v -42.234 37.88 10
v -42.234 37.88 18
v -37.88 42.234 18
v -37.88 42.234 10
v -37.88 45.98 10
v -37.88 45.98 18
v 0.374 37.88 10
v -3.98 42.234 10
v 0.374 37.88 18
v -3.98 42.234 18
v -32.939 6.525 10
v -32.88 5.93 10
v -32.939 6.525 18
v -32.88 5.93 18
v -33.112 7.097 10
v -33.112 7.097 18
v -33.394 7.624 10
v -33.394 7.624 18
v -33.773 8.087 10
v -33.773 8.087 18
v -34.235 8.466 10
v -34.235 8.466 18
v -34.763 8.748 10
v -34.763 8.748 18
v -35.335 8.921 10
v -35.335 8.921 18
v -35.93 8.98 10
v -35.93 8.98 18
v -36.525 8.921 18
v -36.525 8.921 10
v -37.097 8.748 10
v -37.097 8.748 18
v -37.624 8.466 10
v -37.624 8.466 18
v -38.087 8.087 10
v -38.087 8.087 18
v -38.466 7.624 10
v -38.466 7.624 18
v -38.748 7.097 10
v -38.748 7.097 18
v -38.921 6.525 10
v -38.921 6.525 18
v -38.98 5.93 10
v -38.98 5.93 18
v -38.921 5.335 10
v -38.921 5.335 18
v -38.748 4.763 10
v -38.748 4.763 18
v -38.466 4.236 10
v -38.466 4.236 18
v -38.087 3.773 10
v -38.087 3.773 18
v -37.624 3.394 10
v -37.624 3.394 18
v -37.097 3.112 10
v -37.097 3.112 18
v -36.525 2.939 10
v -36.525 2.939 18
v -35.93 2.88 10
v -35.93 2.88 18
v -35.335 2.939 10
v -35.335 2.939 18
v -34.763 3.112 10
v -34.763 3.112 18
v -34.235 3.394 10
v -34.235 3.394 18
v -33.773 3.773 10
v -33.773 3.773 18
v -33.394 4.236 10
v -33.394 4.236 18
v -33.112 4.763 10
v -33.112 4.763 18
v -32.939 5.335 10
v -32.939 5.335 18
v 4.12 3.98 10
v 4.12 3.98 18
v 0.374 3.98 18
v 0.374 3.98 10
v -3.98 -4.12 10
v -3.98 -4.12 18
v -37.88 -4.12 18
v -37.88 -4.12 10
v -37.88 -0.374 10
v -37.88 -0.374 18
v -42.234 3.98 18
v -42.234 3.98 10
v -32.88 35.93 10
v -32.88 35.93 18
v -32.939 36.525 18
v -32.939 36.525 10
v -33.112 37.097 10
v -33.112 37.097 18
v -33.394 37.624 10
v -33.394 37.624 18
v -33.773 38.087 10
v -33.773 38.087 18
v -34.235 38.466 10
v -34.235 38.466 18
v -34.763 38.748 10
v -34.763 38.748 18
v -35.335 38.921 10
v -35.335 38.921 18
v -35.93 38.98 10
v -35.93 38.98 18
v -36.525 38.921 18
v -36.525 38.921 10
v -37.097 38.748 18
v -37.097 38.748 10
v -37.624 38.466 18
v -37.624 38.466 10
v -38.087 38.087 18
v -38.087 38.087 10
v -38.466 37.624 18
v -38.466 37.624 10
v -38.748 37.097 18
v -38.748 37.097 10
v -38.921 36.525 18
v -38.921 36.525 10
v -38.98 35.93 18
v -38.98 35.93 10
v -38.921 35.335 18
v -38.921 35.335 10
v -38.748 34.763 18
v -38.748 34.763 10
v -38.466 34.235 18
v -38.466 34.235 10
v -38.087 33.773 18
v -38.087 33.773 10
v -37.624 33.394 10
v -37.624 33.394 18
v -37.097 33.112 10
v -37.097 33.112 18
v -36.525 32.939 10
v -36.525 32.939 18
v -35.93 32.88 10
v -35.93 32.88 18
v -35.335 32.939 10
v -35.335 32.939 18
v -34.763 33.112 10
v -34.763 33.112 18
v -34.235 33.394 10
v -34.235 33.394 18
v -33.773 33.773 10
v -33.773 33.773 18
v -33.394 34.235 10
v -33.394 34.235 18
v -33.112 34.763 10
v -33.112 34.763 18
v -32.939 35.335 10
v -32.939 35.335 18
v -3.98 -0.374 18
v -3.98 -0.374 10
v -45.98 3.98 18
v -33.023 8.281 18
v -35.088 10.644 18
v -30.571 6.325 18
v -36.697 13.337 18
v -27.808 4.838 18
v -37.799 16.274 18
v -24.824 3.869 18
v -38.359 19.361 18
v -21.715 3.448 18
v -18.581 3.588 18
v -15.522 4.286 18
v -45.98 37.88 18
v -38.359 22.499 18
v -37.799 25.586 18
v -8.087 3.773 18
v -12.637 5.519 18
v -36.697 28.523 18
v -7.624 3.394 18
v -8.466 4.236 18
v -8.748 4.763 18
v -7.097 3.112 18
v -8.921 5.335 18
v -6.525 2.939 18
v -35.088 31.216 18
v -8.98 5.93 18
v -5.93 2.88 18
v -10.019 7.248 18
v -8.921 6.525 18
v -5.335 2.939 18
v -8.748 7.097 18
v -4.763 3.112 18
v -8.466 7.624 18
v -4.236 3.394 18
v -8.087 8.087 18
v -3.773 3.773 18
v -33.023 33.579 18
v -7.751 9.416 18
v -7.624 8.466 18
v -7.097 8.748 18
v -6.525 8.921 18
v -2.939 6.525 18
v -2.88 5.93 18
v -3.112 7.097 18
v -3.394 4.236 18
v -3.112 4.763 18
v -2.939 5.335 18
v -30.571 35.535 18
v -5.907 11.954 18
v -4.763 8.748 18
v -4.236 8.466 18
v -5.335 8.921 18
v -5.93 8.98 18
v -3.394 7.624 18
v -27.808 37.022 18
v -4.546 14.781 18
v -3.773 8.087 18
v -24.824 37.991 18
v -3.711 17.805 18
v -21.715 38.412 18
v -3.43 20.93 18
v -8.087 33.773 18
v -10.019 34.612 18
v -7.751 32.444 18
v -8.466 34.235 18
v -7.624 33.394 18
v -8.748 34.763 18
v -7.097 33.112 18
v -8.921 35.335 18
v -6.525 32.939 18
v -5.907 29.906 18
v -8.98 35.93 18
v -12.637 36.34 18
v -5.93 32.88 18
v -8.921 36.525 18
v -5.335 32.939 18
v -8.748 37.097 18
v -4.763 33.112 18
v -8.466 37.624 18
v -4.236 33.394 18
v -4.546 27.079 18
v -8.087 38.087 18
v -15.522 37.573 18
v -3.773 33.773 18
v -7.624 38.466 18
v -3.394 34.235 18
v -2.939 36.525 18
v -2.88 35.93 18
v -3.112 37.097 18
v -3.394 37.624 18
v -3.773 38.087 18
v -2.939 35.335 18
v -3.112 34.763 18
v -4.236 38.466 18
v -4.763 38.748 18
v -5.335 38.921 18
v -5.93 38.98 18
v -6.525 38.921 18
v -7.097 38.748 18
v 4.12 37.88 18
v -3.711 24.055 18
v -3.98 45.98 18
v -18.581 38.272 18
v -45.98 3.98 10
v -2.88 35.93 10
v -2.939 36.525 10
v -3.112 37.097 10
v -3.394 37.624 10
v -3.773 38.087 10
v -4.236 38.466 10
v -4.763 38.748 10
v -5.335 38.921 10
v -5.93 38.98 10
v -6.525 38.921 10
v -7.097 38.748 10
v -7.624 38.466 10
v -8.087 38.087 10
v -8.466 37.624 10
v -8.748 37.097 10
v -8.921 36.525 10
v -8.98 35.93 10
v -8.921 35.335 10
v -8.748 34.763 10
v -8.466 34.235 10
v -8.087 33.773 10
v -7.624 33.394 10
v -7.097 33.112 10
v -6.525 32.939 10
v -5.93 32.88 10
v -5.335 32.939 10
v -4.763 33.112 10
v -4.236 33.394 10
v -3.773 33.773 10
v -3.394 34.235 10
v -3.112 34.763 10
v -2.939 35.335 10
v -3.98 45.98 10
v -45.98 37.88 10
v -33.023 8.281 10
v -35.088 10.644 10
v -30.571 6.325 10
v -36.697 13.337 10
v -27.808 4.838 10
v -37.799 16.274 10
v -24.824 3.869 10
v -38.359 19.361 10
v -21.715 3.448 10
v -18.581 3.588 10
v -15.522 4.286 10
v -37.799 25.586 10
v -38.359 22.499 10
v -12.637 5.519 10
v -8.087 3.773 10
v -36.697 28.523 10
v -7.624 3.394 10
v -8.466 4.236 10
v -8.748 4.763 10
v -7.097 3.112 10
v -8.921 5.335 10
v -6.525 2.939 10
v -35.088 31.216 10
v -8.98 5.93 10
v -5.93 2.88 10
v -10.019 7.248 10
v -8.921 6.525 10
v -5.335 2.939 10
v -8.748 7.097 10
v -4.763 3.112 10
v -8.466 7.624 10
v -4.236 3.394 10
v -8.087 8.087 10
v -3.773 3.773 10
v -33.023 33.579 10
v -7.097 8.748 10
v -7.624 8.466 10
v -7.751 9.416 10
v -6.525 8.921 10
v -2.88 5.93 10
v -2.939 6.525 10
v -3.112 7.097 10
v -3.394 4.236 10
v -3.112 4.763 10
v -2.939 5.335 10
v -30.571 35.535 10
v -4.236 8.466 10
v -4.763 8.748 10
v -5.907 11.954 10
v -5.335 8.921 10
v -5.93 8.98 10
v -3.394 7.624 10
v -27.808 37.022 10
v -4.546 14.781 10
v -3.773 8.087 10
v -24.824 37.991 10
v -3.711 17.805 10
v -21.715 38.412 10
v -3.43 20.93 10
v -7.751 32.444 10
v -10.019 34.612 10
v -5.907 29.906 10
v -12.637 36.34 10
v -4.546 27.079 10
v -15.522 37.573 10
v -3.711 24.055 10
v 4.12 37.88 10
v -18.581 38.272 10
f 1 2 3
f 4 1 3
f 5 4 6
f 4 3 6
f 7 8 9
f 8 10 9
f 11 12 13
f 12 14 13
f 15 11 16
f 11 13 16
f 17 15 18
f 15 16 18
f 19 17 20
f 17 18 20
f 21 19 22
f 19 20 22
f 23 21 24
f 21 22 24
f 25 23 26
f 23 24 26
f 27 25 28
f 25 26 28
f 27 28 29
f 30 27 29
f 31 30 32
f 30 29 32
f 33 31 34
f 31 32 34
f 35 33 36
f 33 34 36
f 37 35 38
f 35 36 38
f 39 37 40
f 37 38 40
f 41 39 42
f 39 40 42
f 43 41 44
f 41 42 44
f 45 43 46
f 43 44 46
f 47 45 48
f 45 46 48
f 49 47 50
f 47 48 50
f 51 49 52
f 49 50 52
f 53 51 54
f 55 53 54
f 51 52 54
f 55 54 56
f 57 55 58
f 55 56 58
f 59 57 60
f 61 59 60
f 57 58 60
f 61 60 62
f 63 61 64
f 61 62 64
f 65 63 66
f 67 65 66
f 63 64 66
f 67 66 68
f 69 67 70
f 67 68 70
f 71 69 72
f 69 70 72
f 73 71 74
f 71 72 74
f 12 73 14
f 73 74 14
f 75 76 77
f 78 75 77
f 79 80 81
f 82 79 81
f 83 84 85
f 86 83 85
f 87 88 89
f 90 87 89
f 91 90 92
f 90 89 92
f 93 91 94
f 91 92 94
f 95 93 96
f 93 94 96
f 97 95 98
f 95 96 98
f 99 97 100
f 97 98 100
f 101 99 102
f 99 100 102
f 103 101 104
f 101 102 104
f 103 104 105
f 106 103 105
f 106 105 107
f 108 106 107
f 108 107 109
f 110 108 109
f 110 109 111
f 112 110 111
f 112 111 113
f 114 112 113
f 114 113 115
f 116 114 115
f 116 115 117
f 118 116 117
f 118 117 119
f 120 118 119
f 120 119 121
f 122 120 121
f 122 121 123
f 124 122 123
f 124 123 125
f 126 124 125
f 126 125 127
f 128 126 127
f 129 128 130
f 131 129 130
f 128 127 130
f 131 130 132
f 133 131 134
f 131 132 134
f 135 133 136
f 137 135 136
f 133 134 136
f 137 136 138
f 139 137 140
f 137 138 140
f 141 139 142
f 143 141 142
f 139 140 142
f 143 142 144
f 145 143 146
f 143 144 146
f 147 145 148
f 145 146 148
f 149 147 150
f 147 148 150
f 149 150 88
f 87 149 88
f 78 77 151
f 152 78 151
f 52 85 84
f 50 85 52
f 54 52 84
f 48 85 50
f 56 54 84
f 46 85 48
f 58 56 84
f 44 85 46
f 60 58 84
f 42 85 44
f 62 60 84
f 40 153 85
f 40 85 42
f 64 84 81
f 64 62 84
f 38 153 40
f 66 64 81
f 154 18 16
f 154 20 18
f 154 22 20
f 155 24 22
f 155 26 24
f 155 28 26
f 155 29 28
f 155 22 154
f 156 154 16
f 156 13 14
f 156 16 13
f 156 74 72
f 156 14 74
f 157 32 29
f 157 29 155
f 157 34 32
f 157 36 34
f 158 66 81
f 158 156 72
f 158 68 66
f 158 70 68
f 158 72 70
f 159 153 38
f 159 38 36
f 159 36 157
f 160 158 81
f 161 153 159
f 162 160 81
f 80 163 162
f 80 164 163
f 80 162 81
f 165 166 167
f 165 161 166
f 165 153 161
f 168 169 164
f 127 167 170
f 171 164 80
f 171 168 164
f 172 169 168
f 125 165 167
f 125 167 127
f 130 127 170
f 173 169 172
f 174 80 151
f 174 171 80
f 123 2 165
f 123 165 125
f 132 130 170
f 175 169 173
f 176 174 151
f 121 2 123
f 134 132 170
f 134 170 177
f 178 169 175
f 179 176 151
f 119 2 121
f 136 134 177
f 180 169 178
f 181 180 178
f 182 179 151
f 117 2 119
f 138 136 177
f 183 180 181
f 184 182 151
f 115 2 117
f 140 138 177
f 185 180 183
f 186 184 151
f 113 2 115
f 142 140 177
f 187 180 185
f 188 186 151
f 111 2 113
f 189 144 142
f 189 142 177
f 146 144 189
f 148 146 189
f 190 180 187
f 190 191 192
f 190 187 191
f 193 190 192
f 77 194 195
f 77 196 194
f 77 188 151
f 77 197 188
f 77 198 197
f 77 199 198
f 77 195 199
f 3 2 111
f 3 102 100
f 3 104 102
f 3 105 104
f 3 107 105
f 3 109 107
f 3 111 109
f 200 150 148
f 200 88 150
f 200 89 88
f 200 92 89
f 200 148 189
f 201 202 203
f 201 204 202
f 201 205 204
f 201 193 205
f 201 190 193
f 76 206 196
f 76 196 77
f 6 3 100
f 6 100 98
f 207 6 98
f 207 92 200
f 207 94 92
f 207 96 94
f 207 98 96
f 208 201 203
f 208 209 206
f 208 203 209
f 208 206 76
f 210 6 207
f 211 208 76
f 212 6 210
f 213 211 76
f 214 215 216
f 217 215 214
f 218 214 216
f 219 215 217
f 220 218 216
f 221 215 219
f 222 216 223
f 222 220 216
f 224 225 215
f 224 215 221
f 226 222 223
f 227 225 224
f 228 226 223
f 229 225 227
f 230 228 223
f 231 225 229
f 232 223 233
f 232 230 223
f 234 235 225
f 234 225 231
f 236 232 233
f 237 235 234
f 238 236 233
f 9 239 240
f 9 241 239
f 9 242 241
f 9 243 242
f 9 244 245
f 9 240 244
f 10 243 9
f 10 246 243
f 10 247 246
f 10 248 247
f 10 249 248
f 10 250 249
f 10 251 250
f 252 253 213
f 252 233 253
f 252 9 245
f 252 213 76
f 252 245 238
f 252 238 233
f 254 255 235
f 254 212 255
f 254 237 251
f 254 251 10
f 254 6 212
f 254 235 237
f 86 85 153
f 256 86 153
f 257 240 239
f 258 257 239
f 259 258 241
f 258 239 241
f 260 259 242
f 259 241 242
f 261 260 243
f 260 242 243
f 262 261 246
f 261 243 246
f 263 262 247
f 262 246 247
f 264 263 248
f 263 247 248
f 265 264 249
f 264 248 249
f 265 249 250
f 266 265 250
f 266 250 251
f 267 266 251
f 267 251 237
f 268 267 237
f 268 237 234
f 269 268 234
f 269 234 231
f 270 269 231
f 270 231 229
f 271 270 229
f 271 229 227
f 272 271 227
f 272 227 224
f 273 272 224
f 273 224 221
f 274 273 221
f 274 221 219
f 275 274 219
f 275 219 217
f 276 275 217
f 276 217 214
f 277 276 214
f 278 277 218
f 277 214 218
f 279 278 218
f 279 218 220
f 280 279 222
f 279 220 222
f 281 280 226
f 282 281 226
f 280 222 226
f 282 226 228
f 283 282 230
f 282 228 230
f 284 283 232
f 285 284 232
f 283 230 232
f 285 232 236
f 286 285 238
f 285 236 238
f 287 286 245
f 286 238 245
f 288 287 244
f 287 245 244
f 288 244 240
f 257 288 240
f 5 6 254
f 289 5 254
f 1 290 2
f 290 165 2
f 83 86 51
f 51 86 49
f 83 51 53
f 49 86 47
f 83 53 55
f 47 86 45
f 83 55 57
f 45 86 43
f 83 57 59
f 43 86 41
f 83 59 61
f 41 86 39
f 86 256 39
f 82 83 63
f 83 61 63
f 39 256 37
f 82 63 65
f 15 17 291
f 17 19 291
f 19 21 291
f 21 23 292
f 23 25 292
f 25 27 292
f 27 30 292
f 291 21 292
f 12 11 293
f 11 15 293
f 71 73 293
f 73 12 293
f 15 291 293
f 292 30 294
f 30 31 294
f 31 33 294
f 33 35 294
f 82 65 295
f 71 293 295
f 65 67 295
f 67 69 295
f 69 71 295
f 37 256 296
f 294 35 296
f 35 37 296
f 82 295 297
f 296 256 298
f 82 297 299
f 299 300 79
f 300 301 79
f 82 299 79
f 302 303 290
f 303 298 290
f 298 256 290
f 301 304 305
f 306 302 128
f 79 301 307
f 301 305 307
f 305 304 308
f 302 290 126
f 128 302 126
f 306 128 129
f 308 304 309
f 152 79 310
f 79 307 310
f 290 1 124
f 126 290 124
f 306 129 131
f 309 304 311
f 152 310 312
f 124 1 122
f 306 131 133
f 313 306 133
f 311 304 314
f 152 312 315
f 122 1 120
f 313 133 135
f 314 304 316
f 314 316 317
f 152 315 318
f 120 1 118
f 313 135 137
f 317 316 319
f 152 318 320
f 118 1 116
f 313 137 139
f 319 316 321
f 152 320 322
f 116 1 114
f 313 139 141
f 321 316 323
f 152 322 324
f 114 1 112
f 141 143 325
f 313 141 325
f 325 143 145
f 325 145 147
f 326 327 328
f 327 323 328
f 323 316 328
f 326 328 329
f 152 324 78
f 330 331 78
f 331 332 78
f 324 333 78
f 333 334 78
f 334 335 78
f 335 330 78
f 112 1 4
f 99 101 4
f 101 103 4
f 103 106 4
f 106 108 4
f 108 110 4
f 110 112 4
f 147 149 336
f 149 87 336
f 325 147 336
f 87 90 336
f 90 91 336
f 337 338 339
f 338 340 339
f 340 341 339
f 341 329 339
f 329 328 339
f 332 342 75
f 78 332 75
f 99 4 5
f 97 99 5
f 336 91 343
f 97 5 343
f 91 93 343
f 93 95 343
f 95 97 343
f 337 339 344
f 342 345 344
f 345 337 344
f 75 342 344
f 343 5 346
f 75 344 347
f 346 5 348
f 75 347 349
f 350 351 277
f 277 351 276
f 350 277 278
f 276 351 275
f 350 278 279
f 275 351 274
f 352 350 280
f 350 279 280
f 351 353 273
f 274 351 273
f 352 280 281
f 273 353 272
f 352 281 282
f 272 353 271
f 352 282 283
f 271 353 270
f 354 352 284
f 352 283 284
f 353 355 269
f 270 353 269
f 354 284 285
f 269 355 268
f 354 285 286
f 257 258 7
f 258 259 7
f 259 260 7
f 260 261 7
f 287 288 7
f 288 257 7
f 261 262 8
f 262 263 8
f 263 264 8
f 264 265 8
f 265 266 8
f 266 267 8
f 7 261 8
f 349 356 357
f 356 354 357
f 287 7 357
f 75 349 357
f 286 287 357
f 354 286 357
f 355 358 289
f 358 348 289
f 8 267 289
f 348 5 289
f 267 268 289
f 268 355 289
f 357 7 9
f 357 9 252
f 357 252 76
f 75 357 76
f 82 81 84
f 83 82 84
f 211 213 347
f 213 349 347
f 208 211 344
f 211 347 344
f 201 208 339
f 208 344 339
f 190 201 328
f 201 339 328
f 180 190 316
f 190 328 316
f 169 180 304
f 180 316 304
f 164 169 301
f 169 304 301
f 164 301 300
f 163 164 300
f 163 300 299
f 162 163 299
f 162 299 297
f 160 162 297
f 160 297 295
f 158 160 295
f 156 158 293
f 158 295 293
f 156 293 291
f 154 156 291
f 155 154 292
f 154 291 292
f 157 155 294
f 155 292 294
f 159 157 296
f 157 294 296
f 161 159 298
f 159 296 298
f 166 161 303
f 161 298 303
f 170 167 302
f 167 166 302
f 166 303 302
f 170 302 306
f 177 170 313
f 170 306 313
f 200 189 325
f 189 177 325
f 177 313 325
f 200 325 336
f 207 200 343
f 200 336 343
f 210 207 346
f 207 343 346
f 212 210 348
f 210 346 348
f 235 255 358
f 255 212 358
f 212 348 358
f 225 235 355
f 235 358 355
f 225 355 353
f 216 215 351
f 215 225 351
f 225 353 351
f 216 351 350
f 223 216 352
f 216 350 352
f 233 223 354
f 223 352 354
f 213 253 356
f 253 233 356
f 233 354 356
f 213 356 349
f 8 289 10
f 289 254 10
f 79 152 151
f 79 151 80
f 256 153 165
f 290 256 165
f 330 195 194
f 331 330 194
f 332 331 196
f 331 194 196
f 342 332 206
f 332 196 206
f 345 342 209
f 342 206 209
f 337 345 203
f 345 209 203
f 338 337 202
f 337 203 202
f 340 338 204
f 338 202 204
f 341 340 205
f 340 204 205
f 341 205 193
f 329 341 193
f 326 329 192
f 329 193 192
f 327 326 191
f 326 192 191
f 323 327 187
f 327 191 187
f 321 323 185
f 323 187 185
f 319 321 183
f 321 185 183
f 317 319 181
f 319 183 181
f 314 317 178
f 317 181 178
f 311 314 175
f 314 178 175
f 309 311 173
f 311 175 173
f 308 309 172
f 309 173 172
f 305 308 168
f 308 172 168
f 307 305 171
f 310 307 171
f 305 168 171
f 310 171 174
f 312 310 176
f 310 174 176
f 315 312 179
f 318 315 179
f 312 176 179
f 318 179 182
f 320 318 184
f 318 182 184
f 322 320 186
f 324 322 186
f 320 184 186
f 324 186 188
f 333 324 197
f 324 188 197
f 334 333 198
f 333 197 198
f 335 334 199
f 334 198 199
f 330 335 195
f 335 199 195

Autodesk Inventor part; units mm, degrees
ref_plane "YZ Plane" through (0, 0, 0) normal (1, 0, 0) x (0, 1, 0)
ref_plane "XZ Plane" through (0, 0, 0) normal (0, 1, 0) x (-1, 0, 0)
ref_plane "Work Plane1" through (0, 0, 10) normal (0, 0, 1) x (1, 0, 0)
sketch "Sketch1" plane through (0, 0, 10) normal (0, 0, 1) x (1, 0, 0)
  line L0 (-4.0299, -0.3538) -> (-2.2322, 1.4439) construction
  arc A0 (-1.4439, 2.2322) -> (-2.2322, 1.4439) centre (-0.9299, 0.9299) ccw construction
  line L1 (-1.4439, 2.2322) -> (0.3538, 4.0299) construction
  line L2 (-37.8299, 42.8299) -> (-37.8299, 37.8299) construction
  line L3 (-37.8299, 37.8299) -> (-42.9208, 37.8299) construction
  line L4 (-37.8299, 42.2137) -> (-37.8299, 45.8299) construction
  line L5 (-37.8299, 45.8299) -> (-4.0299, 45.8299) construction
  line L6 (-4.0299, 45.8299) -> (-4.0299, 42.2137) construction
  line L7 (-4.0299, 4.0299) -> (0.3538, 4.0299) projected
  circle A1 centre (-20.9299, 20.9299) radius 17.5 projected
  line L8 (-20.9299, 58.9723) -> (17.1124, 20.9299) construction
  line L9 (17.1124, 20.9299) -> (-20.9299, -17.1124) construction
  line L10 (-20.9299, -17.1124) -> (-58.9723, 20.9299) construction
  line L11 (-58.9723, 20.9299) -> (-20.9299, 58.9723) construction
  line L12 (-20.9299, 58.9723) -> (-20.9299, -17.1124) construction
  line L13 (17.1124, 20.9299) -> (-58.9723, 20.9299) construction
  line L14 (-20.9299, 58.9723) -> (32.8701, 58.9723) construction
  line L15 (-43.4299, 43.4299) -> (1.5701, 43.4299) construction
  line L16 (1.5701, 43.4299) -> (1.5701, -1.5701) construction
  line L17 (1.5701, -1.5701) -> (-43.4299, -1.5701) construction
  line L18 (-43.4299, -1.5701) -> (-43.4299, 43.4299) construction
  line L19 (-43.4299, 43.4299) -> (1.5701, -1.5701) construction
  line L20 (1.5701, 43.4299) -> (-43.4299, -1.5701) construction
  line L21 (-43.4299, 5.3876) -> (-43.4299, 36.4723)
  line L22 (-43.4299, 36.4723) -> (-36.4723, 43.4299)
  line L23 (-36.4723, 43.4299) -> (-5.3876, 43.4299)
  line L24 (-5.3876, 43.4299) -> (1.5701, 36.4723)
  line L25 (1.5701, 36.4723) -> (1.5701, 5.3876)
  line L26 (1.5701, 5.3876) -> (-5.3876, -1.5701)
  line L27 (-5.3876, -1.5701) -> (-36.4723, -1.5701)
  line L28 (-36.4723, -1.5701) -> (-43.4299, 5.3876)
  line L29 (-4.0299, 42.2137) -> (-37.8299, 42.2137) projected
  line L30 (-4.0299, -0.3538) -> (-4.0299, 4.0299) projected
  point P0 (-37.8299, 4.0299)
  point P1 (-20.9299, 20.9299)
  dimension "d18" = 53.8
  dimension "d19" = 45
  dimension "d20" = 53.8
  dimension "d21" = 45
  dimension "d22" = 45
extrude "Extrusion1" add sketch "Sketch1" along normal blind 8
sketch "Sketch2" plane through (0, 0, 18) normal (0, 0, 1) x (1, 0, 0)
  circle A0 centre (-35.9299, 35.9299) radius 3.0099 construction
  circle A1 centre (-5.93, 35.9299) radius 3.0099 construction
  circle A2 centre (-5.93, 5.93) radius 3.0099 construction
  circle A3 centre (-35.9299, 5.93) radius 3.0099 construction
  circle A4 centre (-35.9299, 35.9299) radius 3.05
  circle A5 centre (-5.93, 35.9299) radius 3.05
  circle A6 centre (-5.93, 5.93) radius 3.05
  circle A7 centre (-35.9299, 5.93) radius 3.05
  point P0 (0, 0)
  dimension "d30" = 6.1
  dimension "d31" = 6.1
  dimension "d32" = 6.1
  dimension "d33" = 6.1
ref_plane "Work Plane2" through (-40.9959, 0.8639, 22.2359) normal (0, 0, 1) x (1, 0, 0)
extrude "Extrusion2" cut sketch "Sketch2" against normal through all
sketch "Sketch3" plane through (0, 0, 10) normal (0, 0, -1) x (-1, 0, 0)
  line L0 (37.8299, -0.4701) -> (37.8299, 4.0299) construction
  line L1 (4.0299, 4.0299) -> (4.0299, -0.4701) construction
  line L2 (37.8299, -0.4701) -> (37.8299, 1.1886) construction
  line L3 (4.0299, -3.9701) -> (4.0299, -0.3538) construction
  line L4 (45.8299, 4.0299) -> (42.2137, 4.0299) construction
  line L5 (-0.3538, 4.0299) -> (-3.9701, 4.0299) construction
  line L6 (-3.9701, 37.8299) -> (-0.3538, 37.8299) construction
  line L7 (4.0299, 42.2137) -> (4.0299, 45.8299) construction
  line L8 (37.8299, 45.8299) -> (37.8299, 42.2137) construction
  line L9 (42.2137, 37.8299) -> (45.8299, 37.8299) construction
  line L10 (40.4657, 37.7299) -> (45.8299, 37.7299)
  line L11 (45.8299, 37.7299) -> (45.8299, 4.1299)
  line L12 (45.8299, 4.1299) -> (40.4657, 4.1299)
  line L13 (40.4657, 4.1299) -> (40.4657, 37.7299)
  line L14 (37.7299, 2.4952) -> (4.1299, 2.4952)
  line L15 (4.1299, 2.4952) -> (4.1299, -3.9701)
  line L16 (4.1299, -3.9701) -> (37.7299, -3.9701)
  line L17 (37.7299, -3.9701) -> (37.7299, 2.4952)
  line L18 (1.8946, 4.1299) -> (-3.9701, 4.1299)
  line L19 (-3.9701, 4.1299) -> (-3.9701, 37.7299)
  line L20 (-3.9701, 37.7299) -> (1.8946, 37.7299)
  line L21 (1.8946, 37.7299) -> (1.8946, 4.1299)
  line L22 (4.1299, 40.7326) -> (37.7299, 40.7326)
  line L23 (37.7299, 40.7326) -> (37.7299, 45.8299)
  line L24 (37.7299, 45.8299) -> (4.1299, 45.8299)
  line L25 (4.1299, 45.8299) -> (4.1299, 40.7326)
  point P0 (0, 0)
  dimension "d23" = 0.1
  dimension "d24" = 0.1
  dimension "d25" = 0.1
  dimension "d26" = 0.1
  dimension "d27" = 0.1
extrude "Extrusion3" add sketch "Sketch3" against normal up to surface (8 mm away)
sketch "Sketch4" plane through (0, 0, 18) normal (0, 0, 1) x (1, 0, 0)
  line L0 (3.9701, 4.1299) -> (0.3124, 4.1299) projected
  line L1 (3.9701, 37.7299) -> (3.9701, 4.1299) projected
  line L2 (0.3124, 37.7299) -> (3.9701, 37.7299) projected
  line L3 (0.3124, 37.7299) -> (-4.1299, 42.1723) projected
  line L4 (-4.1299, 45.8299) -> (-4.1299, 42.1723) projected
  line L5 (-37.7299, 45.8299) -> (-4.1299, 45.8299) projected
  line L6 (-37.7299, 42.1723) -> (-37.7299, 45.8299) projected
  line L7 (-37.7299, 42.1723) -> (-42.1723, 37.7299) projected
  line L8 (-45.8299, 37.7299) -> (-42.1723, 37.7299) projected
  line L9 (-45.8299, 4.1299) -> (-45.8299, 37.7299) projected
  line L10 (-42.1723, 4.1299) -> (-45.8299, 4.1299) projected
  line L11 (-42.1723, 4.1299) -> (-37.7299, -0.3124) projected
  line L12 (-37.7299, -3.9701) -> (-37.7299, -0.3124) projected
  line L13 (-4.1299, -3.9701) -> (-37.7299, -3.9701) projected
  line L14 (-4.1299, -0.3124) -> (-4.1299, -3.9701) projected
  line L15 (-4.1299, -0.3124) -> (0.3124, 4.1299) projected
  circle A0 centre (-20.9299, 20.9299) radius 17.5 projected
  circle A1 centre (-35.9299, 5.93) radius 3.05 projected
  circle A2 centre (-5.93, 35.9299) radius 3.05 projected
  circle A3 centre (-35.9299, 35.9299) radius 3.05 projected
  circle A4 centre (-5.93, 5.93) radius 3.05 projected
  line L16 (-3.9799, 45.9799) -> (-3.9799, 42.2344)
  line L17 (-3.9799, 42.2344) -> (0.3745, 37.8799)
  line L18 (0.3745, 37.8799) -> (4.1201, 37.8799)
  line L19 (4.1201, 37.8799) -> (4.1201, 3.9799)
  line L20 (4.1201, 3.9799) -> (0.3745, 3.9799)
  line L21 (0.3745, 3.9799) -> (-3.9799, -0.3745)
  line L22 (-3.9799, -0.3745) -> (-3.9799, -4.1201)
  line L23 (-3.9799, -4.1201) -> (-37.8799, -4.1201)
  line L24 (-37.8799, -4.1201) -> (-37.8799, -0.3745)
  line L25 (-37.8799, -0.3745) -> (-42.2344, 3.9799)
  line L26 (-42.2344, 3.9799) -> (-45.9799, 3.9799)
  line L27 (-45.9799, 3.9799) -> (-45.9799, 37.8799)
  line L28 (-45.9799, 37.8799) -> (-42.2344, 37.8799)
  line L29 (-42.2344, 37.8799) -> (-37.8799, 42.2344)
  line L30 (-37.8799, 42.2344) -> (-37.8799, 45.9799)
  line L31 (-37.8799, 45.9799) -> (-3.9799, 45.9799)
  point P0 (0, 0)
  dimension "d34" = 0.15
extrude "Extrusion4" add sketch "Sketch4" against normal up to surface (8 mm away) contours L16 L17 L18 L19 L20 L21 L22 L23 L24 L25 L26 L27 L28 L29 L30 L31
properties part number "50_Cube_Insert_Thorlabs"
